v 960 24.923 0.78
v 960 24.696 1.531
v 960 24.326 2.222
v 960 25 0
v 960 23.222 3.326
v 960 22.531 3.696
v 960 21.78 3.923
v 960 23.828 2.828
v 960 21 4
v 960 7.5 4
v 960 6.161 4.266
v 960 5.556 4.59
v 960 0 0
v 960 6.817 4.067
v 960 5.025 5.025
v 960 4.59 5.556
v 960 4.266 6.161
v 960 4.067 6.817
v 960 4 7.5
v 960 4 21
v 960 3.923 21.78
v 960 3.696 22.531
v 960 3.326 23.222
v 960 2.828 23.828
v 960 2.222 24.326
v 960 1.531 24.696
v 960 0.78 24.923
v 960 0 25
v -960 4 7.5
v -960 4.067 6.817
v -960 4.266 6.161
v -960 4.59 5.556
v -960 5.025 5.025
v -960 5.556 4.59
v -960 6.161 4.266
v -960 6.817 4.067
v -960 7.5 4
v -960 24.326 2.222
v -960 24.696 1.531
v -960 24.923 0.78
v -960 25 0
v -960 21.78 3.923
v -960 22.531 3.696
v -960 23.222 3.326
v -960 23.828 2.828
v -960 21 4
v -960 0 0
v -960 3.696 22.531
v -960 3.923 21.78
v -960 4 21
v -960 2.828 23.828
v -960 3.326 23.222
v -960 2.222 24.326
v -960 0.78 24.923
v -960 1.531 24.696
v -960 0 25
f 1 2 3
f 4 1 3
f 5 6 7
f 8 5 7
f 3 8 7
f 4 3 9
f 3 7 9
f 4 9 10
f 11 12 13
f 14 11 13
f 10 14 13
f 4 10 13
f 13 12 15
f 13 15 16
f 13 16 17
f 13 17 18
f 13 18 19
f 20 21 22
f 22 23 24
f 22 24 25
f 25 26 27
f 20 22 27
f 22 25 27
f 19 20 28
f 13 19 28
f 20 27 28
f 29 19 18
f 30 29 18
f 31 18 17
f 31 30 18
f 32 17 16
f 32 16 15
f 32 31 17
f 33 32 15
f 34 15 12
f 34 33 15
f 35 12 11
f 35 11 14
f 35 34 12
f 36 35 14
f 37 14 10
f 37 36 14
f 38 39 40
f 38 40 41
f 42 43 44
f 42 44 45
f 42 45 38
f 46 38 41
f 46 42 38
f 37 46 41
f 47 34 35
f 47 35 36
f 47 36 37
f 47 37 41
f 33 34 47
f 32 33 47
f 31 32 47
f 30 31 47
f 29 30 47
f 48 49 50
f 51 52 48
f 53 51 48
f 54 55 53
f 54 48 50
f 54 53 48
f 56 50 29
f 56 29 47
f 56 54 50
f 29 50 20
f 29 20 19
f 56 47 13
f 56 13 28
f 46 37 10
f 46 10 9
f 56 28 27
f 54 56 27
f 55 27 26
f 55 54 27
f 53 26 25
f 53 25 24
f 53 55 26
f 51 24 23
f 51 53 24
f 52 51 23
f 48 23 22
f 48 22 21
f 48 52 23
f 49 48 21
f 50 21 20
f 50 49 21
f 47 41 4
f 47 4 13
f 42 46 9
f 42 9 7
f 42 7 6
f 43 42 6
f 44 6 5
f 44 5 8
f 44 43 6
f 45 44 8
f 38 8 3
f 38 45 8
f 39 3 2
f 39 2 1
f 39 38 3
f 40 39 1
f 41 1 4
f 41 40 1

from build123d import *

# Parameters (mm, degrees)
MIEMBRO_ESTRUCTURAL1_DEPTH = 1920


with BuildPart() as part:
    # Sketch1 → Miembro estructural1 (new body)
    with BuildSketch(Plane.YZ.offset(-960)):
        with BuildLine():
            Line((0, 0), (0, 25))
            ThreePointArc((0, 25), (2.828427125, 23.828427125), (4, 21))
            Line((4, 21), (4, 7.5))
            ThreePointArc((4, 7.5), (5.025126266, 5.025126266), (7.5, 4))
            Line((7.5, 4), (21, 4))
            ThreePointArc((21, 4), (23.828427125, 2.828427125), (25, 0))
            Line((25, 0), (0, 0))
        make_face()
    extrude(amount=MIEMBRO_ESTRUCTURAL1_DEPTH)


solid = part.part
